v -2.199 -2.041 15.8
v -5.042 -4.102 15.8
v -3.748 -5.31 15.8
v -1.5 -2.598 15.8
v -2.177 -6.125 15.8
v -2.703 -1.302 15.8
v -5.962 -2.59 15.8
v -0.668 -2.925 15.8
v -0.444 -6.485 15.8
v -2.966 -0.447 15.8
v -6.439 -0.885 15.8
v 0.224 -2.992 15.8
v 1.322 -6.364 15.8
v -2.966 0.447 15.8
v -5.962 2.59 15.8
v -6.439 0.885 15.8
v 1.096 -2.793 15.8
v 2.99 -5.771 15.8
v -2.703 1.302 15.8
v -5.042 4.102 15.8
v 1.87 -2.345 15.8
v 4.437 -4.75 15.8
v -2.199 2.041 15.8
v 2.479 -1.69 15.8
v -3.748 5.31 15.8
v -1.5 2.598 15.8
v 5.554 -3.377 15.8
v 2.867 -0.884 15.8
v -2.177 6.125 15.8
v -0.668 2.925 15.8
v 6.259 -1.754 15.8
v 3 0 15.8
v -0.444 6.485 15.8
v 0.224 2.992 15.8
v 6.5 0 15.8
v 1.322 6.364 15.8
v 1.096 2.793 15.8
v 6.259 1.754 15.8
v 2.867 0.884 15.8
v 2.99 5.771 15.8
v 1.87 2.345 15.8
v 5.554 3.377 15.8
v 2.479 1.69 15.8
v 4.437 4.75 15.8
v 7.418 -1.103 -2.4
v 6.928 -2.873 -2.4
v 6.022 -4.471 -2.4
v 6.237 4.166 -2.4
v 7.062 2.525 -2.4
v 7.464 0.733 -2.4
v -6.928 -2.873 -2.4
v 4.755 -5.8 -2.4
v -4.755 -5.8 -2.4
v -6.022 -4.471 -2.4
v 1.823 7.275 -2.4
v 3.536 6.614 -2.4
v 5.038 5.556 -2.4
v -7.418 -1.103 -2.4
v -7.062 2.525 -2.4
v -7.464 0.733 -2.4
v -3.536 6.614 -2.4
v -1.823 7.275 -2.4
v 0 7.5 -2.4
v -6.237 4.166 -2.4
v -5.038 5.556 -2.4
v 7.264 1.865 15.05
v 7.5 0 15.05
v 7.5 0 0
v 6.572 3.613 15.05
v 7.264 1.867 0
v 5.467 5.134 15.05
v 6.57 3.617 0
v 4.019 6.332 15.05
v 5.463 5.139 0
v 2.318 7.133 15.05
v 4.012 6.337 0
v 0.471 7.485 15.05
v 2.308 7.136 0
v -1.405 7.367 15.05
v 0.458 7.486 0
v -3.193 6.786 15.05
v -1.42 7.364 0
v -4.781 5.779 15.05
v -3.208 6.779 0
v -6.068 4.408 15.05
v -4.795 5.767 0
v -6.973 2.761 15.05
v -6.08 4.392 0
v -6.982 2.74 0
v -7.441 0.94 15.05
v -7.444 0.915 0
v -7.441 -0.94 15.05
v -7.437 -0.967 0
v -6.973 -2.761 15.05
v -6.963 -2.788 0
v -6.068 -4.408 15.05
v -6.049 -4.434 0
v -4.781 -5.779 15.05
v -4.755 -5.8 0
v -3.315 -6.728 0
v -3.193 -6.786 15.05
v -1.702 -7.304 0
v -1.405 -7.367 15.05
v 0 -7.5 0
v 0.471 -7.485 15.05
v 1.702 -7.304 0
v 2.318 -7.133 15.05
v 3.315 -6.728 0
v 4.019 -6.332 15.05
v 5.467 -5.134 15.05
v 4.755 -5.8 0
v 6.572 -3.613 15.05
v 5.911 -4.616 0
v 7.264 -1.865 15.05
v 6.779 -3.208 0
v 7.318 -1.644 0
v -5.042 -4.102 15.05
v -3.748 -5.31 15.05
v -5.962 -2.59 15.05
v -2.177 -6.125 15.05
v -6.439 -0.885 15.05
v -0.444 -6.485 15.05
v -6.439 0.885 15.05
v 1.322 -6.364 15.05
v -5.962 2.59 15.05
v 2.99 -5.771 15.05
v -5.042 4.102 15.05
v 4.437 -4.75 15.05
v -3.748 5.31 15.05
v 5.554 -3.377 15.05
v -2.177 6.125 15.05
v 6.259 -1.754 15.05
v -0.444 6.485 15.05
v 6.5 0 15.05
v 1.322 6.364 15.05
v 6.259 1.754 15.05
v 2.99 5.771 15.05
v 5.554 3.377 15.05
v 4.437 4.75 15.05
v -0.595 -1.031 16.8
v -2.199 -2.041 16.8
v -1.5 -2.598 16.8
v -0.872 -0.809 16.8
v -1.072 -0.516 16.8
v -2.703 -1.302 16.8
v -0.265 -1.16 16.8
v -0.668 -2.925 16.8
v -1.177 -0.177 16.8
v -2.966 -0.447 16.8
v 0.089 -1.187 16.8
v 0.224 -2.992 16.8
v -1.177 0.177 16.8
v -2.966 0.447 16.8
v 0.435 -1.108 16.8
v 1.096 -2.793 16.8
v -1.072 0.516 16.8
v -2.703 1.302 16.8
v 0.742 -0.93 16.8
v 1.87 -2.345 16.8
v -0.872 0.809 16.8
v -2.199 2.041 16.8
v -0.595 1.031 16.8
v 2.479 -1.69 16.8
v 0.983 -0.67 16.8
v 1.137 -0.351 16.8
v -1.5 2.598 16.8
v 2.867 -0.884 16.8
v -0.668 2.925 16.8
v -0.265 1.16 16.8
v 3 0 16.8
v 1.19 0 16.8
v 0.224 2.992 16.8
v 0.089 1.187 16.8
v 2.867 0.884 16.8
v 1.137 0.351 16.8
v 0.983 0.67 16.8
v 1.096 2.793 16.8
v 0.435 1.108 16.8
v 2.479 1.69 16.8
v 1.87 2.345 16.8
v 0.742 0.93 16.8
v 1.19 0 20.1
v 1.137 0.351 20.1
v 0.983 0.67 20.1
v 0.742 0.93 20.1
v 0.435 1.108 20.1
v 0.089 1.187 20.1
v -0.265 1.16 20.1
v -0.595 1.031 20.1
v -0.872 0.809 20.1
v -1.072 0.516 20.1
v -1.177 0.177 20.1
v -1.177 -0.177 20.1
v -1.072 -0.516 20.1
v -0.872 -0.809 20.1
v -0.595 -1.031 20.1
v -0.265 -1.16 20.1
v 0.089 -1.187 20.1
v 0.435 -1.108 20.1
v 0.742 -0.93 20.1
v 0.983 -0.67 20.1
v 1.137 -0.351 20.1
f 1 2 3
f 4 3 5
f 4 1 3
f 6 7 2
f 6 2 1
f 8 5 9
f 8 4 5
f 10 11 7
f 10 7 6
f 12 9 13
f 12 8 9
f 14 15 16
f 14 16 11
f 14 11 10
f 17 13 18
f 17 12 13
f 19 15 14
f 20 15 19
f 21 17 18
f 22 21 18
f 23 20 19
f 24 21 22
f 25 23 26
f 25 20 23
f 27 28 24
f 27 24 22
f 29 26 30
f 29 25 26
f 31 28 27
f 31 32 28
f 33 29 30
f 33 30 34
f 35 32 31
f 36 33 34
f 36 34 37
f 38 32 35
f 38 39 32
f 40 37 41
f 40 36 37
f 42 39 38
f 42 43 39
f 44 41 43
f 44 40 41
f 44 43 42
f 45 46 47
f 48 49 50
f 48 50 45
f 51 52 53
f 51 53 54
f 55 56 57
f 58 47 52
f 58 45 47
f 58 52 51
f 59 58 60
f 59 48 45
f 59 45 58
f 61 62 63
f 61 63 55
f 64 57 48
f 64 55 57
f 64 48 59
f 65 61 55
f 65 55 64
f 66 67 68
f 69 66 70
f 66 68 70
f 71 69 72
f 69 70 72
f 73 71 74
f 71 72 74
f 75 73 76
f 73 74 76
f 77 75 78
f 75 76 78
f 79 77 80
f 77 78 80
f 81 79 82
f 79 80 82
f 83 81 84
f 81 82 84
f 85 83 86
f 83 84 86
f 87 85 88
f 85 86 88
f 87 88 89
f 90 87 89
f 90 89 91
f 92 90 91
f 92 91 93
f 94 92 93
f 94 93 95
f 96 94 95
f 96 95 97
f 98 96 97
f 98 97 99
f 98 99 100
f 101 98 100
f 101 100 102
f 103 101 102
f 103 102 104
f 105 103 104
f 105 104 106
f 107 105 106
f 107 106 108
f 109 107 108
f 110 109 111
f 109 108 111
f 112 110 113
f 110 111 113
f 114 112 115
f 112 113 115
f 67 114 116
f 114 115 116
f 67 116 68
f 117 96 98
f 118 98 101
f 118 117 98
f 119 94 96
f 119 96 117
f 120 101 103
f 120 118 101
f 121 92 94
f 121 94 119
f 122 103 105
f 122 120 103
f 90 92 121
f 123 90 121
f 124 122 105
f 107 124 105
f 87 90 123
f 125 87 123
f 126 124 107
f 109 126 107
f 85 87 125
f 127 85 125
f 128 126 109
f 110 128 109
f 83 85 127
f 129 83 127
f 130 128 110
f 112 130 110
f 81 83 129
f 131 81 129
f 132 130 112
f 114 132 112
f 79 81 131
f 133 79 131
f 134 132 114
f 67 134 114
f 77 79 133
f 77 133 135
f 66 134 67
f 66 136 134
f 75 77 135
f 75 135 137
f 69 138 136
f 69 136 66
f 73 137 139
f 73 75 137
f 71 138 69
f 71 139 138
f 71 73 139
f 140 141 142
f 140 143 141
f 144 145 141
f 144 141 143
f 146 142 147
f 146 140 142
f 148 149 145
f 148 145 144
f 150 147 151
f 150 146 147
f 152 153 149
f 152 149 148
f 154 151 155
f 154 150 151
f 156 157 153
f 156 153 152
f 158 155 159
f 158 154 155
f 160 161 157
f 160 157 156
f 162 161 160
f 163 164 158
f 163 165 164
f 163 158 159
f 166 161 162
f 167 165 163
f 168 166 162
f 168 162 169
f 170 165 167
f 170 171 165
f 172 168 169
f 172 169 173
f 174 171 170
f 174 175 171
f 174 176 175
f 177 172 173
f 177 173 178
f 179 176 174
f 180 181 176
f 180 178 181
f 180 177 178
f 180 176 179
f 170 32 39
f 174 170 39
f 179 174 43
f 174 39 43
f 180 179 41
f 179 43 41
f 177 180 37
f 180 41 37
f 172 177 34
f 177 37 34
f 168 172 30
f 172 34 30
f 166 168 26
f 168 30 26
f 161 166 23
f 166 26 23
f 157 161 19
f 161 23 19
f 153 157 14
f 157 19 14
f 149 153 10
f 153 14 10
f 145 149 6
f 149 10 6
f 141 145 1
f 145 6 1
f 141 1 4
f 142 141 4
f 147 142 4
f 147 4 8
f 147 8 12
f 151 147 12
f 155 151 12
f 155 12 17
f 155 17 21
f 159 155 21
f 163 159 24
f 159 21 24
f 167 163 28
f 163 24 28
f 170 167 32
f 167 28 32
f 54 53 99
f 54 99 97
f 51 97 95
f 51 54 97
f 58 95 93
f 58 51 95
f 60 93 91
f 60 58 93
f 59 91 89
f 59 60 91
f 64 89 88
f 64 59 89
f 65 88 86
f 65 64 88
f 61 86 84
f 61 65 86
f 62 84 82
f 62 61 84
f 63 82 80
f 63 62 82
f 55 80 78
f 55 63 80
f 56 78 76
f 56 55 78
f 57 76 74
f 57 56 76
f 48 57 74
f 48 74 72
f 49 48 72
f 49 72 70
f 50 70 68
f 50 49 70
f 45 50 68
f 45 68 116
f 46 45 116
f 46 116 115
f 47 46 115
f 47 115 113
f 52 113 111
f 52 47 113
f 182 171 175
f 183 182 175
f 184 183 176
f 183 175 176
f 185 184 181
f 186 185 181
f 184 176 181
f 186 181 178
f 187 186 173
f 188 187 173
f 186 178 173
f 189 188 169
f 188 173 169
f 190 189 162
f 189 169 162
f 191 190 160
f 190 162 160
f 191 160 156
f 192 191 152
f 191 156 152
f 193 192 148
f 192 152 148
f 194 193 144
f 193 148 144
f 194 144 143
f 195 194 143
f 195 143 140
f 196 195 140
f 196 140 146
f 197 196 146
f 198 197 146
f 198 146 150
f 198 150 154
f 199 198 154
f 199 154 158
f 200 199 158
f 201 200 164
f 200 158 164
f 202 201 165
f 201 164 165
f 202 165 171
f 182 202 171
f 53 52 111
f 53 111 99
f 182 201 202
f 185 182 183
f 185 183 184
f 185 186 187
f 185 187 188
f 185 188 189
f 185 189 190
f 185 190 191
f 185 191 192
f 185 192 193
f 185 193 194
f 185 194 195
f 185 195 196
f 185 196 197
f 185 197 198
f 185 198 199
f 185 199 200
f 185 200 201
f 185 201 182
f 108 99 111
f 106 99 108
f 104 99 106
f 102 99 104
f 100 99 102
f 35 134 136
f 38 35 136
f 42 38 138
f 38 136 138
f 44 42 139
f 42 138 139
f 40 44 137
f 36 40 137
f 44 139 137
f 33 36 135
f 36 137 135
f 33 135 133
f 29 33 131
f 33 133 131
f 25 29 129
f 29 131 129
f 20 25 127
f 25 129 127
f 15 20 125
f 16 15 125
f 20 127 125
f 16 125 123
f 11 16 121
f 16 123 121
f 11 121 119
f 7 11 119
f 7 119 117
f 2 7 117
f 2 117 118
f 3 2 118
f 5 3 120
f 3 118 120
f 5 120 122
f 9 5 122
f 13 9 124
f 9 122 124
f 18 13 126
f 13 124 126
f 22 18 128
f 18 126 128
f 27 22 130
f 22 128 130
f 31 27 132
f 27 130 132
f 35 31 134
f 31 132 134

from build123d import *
from build123d.topology import SkipClean

# Parameters (mm, degrees)
ESQUISSE1_R        = 7.5
BOSS_EXTRU_1_DEPTH = 15.05
ESQUISSE3_R        = 6.5
BOSS_EXTRU_2_DEPTH = 0.75
ESQUISSE4_R        = 3
BOSS_EXTRU_3_DEPTH = 1
ESQUISSE5_R        = 1.19
BOSS_EXTRU_4_DEPTH = 3.3
BOSS_EXTRU_7_START = 2.4
BOSS_EXTRU_7_DEPTH = 2.4


with BuildPart() as part:
    # Esquisse1 → Boss.-Extru.1 (new body)
    with BuildSketch(Plane.XY):
        Circle(ESQUISSE1_R)
    extrude(amount=BOSS_EXTRU_1_DEPTH)

    # Esquisse3 → Boss.-Extru.2 (add)
    with BuildSketch(Plane.XY.offset(15.05)):
        Circle(ESQUISSE3_R)
    extrude(amount=BOSS_EXTRU_2_DEPTH)

    # Esquisse4 → Boss.-Extru.3 (add)
    with BuildSketch(Plane.XY.offset(15.8)):
        Circle(ESQUISSE4_R)
    extrude(amount=BOSS_EXTRU_3_DEPTH)

    # Esquisse5 → Boss.-Extru.4 (add)
    with BuildSketch(Plane.XY.offset(16.8)):
        Circle(ESQUISSE5_R)
    extrude(amount=BOSS_EXTRU_4_DEPTH)

    # Esquisse8 → Boss.-Extru.7 (add)
    with SkipClean():  # the faces are left unmerged after this step: merging them gives an invalid solid
        with BuildSketch(Plane(origin=(0, 0, 0), x_dir=(-1, 0, 0), z_dir=(0, 0, -1)).offset(BOSS_EXTRU_7_START)):
            with BuildLine():
                Line((-4.754997371, -5.8), (4.754997371, -5.8))
                ThreePointArc((4.754997371, -5.8), (0, 7.5), (-4.754997371, -5.8))
            make_face()
        extrude(amount=-BOSS_EXTRU_7_DEPTH)


solid = part.part
